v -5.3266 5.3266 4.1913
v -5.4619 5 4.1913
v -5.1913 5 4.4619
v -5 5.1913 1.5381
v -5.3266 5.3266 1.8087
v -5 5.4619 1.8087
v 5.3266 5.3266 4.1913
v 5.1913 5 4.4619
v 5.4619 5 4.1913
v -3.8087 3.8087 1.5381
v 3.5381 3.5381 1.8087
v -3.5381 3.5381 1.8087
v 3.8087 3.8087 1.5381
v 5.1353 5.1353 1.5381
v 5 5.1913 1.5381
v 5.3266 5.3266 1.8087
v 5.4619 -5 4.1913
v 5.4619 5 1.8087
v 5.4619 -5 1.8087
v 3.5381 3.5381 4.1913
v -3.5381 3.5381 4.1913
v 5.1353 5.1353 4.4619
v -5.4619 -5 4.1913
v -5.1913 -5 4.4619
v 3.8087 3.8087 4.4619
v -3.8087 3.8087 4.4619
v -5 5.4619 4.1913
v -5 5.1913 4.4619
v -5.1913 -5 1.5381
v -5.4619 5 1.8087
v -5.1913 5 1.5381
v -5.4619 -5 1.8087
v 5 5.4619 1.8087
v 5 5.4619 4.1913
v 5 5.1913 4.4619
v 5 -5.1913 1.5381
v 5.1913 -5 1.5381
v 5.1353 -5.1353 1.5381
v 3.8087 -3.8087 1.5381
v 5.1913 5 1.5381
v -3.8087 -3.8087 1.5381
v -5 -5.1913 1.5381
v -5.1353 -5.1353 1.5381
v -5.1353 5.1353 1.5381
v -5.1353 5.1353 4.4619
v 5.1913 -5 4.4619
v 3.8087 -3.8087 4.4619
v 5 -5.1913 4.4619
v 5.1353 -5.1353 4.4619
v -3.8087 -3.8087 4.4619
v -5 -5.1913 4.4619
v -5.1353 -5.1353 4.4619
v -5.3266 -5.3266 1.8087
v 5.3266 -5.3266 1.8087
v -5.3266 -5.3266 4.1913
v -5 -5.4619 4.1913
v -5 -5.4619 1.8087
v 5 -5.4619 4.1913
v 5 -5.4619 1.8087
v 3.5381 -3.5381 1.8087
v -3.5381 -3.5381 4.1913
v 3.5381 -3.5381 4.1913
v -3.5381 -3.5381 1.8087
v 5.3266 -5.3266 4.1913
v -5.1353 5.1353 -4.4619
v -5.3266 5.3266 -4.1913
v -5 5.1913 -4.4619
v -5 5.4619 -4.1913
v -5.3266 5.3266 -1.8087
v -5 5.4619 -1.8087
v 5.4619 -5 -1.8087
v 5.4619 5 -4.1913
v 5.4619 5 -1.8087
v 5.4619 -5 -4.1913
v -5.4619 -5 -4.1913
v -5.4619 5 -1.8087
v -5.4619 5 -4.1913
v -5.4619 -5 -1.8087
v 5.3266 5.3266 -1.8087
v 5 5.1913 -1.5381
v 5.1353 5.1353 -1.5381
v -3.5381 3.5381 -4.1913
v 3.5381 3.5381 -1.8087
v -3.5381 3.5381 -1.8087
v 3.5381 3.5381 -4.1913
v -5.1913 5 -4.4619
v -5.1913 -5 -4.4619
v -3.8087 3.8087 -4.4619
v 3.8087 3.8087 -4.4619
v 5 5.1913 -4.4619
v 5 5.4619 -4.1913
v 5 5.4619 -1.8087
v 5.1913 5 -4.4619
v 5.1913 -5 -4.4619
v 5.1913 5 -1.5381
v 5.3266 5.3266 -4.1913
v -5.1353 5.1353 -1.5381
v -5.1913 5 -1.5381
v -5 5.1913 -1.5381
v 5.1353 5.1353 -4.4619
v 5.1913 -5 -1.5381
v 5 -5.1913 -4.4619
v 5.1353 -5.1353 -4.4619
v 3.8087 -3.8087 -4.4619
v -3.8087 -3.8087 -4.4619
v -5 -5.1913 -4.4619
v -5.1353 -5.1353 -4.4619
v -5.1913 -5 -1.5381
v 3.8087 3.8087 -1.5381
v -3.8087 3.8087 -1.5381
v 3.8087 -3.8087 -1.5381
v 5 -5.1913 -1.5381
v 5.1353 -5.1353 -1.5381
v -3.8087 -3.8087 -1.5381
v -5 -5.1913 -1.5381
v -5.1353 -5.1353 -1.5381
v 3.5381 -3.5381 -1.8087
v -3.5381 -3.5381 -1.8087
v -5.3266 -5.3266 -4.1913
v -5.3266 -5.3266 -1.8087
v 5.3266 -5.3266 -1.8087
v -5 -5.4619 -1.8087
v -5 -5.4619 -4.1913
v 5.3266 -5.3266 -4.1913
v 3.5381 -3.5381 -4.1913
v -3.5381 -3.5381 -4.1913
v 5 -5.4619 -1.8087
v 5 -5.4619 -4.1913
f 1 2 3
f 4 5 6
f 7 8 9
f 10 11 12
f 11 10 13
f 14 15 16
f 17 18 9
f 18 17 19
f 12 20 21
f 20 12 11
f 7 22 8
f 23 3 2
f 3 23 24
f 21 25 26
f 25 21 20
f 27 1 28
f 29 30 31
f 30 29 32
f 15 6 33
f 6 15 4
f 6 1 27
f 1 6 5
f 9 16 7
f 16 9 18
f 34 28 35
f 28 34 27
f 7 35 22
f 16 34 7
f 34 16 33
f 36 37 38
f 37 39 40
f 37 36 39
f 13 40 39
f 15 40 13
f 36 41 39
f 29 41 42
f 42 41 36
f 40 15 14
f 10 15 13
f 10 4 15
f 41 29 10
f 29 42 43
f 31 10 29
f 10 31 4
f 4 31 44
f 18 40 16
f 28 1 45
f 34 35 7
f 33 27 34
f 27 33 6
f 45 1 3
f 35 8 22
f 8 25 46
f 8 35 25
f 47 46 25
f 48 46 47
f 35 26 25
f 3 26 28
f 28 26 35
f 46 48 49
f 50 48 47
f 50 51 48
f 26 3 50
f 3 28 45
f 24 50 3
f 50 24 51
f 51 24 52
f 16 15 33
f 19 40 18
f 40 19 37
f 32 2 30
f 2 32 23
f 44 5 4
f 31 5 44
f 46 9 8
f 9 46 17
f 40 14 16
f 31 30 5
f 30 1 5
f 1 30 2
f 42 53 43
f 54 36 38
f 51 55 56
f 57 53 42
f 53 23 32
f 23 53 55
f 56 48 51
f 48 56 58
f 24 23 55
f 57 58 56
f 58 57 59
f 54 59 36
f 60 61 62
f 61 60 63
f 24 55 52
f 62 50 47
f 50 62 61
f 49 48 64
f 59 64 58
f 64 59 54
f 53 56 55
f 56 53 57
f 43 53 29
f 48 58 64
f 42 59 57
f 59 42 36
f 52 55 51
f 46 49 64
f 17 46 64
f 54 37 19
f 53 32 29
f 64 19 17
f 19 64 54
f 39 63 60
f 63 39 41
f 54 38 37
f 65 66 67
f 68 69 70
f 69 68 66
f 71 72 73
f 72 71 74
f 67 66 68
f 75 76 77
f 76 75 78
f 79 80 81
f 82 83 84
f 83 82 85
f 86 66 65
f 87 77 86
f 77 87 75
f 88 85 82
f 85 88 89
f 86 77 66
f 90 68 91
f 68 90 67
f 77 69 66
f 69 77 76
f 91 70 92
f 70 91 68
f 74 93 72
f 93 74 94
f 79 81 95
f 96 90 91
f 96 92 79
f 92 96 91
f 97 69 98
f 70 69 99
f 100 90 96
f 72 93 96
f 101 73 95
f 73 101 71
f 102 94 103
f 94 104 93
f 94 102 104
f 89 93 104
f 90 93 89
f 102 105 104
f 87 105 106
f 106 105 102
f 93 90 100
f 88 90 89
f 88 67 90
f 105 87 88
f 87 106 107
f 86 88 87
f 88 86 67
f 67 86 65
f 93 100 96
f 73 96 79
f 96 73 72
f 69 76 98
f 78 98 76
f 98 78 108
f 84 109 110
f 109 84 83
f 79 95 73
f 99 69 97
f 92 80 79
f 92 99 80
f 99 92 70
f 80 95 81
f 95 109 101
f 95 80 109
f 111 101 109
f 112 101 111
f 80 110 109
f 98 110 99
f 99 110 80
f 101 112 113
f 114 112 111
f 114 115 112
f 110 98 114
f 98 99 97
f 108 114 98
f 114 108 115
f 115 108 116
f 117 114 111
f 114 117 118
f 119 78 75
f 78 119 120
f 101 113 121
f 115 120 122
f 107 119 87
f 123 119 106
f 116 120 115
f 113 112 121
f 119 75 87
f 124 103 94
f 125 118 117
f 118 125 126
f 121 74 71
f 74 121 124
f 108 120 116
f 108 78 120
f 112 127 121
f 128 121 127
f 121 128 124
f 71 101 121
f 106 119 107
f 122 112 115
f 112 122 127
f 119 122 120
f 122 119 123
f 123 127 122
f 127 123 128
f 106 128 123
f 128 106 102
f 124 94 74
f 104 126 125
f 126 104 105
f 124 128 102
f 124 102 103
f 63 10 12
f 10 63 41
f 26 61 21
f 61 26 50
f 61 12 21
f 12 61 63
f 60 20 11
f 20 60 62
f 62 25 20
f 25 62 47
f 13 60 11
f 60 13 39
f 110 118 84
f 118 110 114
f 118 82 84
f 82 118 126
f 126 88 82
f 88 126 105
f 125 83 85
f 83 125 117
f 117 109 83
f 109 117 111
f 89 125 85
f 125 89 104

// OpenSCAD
minkowski() {
  union() {
    difference() {
      cube([10,10,8], center=true);
      cube([8,8,10], center=true);
    }
    cube([12, 12, 4], center=true);
  }
  sphere(0.5, $fn=8);
}
